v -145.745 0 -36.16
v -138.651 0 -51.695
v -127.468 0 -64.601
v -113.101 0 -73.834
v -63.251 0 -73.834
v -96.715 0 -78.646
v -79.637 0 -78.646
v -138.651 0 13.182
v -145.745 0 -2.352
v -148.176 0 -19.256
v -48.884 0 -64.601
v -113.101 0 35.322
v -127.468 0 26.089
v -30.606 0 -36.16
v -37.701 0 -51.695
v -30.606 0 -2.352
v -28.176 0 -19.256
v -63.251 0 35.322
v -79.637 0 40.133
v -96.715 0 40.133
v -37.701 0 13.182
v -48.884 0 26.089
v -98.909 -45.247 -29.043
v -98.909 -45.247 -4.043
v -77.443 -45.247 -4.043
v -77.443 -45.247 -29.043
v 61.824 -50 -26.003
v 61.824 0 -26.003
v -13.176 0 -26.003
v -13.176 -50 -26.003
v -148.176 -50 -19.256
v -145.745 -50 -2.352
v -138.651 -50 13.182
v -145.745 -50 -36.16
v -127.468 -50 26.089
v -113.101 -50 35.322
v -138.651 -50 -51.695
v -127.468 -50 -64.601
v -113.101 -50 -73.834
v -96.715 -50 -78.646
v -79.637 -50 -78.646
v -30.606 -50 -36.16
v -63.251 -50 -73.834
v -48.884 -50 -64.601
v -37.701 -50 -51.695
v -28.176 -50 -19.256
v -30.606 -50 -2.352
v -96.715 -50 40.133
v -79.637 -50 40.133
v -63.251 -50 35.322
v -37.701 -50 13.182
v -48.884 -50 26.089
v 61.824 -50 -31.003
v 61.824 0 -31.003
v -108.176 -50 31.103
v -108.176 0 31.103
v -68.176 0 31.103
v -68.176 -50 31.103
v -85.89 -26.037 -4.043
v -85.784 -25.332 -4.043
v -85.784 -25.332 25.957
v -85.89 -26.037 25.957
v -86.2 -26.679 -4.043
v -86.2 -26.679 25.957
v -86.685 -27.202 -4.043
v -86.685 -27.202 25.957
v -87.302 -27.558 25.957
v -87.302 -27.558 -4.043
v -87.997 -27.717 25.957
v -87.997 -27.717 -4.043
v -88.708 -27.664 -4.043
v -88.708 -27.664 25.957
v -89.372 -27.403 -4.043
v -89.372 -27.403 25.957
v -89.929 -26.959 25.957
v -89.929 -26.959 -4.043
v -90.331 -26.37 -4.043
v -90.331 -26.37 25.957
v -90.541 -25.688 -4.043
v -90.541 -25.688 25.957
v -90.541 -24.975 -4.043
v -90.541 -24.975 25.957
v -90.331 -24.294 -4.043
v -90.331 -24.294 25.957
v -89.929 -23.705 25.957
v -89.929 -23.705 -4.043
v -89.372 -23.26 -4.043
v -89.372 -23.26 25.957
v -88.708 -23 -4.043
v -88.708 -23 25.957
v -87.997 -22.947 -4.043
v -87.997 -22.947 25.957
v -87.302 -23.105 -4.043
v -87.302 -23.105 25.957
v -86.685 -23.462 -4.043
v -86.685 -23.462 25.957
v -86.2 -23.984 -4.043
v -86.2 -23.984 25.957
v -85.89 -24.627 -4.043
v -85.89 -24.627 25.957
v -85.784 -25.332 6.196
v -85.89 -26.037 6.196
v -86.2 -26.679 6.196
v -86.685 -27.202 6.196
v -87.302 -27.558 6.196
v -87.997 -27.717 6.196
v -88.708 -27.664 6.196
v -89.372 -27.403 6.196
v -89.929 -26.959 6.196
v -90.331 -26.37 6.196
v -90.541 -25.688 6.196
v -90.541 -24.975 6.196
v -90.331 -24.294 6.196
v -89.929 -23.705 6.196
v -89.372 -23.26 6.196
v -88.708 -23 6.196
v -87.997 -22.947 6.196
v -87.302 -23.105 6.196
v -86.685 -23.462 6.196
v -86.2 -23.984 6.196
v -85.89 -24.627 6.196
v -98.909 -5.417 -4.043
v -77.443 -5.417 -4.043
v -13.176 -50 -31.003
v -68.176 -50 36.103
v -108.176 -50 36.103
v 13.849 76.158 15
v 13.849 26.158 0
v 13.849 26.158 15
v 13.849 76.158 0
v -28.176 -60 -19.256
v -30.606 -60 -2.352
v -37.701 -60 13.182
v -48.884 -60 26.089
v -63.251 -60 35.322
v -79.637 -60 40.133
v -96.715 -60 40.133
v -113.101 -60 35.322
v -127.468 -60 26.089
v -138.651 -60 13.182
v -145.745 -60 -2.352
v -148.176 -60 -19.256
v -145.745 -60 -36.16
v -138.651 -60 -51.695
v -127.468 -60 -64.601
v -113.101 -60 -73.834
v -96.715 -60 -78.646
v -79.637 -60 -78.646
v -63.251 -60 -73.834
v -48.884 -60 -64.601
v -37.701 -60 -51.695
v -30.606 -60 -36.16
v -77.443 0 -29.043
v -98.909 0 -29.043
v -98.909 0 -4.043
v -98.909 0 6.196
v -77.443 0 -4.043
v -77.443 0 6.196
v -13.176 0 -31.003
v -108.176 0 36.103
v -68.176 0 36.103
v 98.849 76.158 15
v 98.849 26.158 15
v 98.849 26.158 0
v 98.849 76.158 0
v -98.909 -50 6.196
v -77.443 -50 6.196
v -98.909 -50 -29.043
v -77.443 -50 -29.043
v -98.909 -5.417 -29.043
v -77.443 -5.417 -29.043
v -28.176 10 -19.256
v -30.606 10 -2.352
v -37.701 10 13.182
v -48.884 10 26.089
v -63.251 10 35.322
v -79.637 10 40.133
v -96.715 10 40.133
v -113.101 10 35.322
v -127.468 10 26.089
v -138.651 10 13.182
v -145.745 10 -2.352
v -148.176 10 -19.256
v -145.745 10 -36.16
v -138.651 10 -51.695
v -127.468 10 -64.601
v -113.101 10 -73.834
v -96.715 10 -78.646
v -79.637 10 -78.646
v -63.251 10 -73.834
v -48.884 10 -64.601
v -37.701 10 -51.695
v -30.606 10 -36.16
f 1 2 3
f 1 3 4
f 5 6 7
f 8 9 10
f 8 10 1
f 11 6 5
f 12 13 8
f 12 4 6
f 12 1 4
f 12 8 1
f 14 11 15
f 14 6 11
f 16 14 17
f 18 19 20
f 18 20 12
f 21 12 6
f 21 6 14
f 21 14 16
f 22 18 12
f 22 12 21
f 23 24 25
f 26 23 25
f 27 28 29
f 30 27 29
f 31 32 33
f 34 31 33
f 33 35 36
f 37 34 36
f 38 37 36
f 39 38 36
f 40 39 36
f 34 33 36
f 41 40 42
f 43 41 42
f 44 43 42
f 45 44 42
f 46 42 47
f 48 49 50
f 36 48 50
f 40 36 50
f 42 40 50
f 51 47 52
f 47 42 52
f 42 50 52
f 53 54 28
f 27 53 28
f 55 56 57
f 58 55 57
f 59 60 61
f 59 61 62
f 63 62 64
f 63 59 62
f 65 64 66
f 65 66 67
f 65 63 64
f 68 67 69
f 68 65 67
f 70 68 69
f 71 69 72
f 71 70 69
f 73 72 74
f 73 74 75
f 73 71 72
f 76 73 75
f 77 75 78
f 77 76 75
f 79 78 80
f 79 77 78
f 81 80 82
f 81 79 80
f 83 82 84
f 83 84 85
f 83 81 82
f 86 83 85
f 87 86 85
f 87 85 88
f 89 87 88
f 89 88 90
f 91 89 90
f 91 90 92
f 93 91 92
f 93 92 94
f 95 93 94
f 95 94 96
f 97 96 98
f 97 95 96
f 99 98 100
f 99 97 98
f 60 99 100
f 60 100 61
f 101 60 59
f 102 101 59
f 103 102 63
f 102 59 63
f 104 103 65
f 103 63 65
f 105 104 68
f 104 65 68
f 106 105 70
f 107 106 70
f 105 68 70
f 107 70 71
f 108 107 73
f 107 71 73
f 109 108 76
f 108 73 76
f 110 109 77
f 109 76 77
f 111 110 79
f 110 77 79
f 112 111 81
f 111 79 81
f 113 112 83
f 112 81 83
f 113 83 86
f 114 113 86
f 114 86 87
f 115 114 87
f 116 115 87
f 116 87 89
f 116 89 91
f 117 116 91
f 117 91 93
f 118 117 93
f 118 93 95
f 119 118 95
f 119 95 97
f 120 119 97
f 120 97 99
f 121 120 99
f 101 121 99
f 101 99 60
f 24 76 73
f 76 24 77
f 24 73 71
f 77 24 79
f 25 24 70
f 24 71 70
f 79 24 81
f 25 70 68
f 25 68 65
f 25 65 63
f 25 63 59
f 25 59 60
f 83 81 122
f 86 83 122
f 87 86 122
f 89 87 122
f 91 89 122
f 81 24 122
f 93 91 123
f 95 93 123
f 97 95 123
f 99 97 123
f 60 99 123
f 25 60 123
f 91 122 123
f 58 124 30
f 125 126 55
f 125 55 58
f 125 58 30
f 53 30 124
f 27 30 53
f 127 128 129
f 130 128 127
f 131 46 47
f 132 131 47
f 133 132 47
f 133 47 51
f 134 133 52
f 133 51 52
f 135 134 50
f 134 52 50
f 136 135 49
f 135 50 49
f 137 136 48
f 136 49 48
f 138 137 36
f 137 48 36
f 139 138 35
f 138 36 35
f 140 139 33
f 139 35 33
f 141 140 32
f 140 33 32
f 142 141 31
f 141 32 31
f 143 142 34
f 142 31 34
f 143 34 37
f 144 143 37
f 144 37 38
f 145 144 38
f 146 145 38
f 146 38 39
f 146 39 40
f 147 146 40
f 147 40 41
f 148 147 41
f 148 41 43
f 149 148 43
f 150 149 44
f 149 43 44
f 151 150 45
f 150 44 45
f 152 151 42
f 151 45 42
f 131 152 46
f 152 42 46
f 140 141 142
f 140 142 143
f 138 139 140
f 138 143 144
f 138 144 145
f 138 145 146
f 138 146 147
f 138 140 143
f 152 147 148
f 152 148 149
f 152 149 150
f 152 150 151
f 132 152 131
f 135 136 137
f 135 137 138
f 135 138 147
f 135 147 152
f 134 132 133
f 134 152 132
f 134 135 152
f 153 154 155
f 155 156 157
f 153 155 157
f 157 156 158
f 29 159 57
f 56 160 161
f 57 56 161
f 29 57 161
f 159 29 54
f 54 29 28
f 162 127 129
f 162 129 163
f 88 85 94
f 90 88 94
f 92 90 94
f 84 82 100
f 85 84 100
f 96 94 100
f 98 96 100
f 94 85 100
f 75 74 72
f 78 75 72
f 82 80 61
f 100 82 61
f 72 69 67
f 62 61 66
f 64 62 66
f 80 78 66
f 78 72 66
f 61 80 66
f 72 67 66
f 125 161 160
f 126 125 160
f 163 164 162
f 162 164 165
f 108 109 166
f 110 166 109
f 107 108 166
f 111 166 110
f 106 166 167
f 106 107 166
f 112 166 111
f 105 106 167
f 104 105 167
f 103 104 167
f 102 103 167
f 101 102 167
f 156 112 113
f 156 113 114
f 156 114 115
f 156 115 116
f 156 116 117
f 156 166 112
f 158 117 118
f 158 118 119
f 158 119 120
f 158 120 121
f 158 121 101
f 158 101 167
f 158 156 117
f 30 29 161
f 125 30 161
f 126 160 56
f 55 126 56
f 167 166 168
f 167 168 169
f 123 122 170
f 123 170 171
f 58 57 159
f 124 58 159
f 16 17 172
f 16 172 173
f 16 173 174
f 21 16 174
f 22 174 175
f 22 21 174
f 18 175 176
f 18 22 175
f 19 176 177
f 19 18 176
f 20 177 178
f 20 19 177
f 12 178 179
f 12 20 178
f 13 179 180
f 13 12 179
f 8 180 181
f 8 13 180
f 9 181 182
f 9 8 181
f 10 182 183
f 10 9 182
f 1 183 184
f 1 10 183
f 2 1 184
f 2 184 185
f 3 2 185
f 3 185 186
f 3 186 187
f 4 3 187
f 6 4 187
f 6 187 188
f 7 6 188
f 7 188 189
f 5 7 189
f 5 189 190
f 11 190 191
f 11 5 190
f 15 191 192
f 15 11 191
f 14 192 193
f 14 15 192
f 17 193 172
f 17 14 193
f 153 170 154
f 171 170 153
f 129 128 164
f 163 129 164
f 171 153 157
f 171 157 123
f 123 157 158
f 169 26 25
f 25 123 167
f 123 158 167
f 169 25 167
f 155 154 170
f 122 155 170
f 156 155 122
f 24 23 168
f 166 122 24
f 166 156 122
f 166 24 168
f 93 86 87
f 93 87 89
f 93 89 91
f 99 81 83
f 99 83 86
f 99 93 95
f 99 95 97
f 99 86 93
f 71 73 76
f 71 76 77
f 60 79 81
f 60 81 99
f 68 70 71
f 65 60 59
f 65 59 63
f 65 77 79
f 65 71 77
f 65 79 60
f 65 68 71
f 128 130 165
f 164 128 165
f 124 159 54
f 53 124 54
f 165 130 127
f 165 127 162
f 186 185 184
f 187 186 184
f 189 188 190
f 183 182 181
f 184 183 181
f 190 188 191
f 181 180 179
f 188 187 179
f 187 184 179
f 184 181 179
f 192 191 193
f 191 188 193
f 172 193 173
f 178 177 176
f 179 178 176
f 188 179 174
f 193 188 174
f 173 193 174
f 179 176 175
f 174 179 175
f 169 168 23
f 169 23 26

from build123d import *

# Parameters (mm, degrees)
F1_DEPTH  = 50
F0_W      = 21.4654916469
F0_H      = 10.2392081211
F2_W      = 21.4654916469
F2_H      = 4.7531977296
F2_H_2    = 5.4168240167
F3_DEPTH  = 25
F4_R      = 60
F4_W      = 21.4654916469
F4_H      = 35.2392081211
F5_DEPTH  = 10
F6_START  = -50
F6_DEPTH  = 10
F7_R      = 2.3919276082
F8_DEPTH  = 30
F10_W     = 85
F10_H     = 50
F11_DEPTH = 15


with BuildPart() as f1:
    # F0 (on Front) → F1 (new body)
    with BuildSketch(Plane.XZ):
        Polygon((-68.1759184846, 36.1026065934), (-108.1759184846, 36.1026065934), (-108.1759184846, 31.1026065934), (-68.1759184846, 31.1026065934), (-13.1759184846, -31.0028278501), (61.8240815154, -31.0028278501), (61.8240815154, -26.0028278501), (-13.1759184846, -26.0028278501), align=None)
    extrude(amount=F1_DEPTH)


with BuildPart() as f1b:
    # F0 (on Front) → F1, piece 2 (new body)
    with BuildSketch(Plane.XZ):
        with Locations((-88.1759184846, 1.0764846312)):
            Rectangle(F0_W, F0_H)
    extrude(amount=F1_DEPTH)

    # F2 (on face) → F3 (join)
    with BuildSketch(Plane(origin=(0, 0, -4.0431194294), x_dir=(1, 0, 0), z_dir=(0, 0, -1))):
        with Locations((-88.1759184846, 47.6234011352)):
            Rectangle(F2_W, F2_H)
        with Locations((-88.1759184846, 2.7084120084)):
            Rectangle(F2_W, F2_H_2)
    extrude(amount=F3_DEPTH)


with BuildPart() as f5:
    # F4 (on face) → F5 (new body)
    with BuildSketch(Plane.XZ.offset(50)):
        with Locations((-88.1759184846, -19.2563140502)):
            Circle(F4_R)
        with Locations((-88.1759184846, -11.4235153688)):
            Rectangle(F4_W, F4_H, mode=Mode.SUBTRACT)
        with Locations((-88.1759184846, -11.4235153688)):
            Rectangle(F4_W, F4_H)
    extrude(amount=F5_DEPTH)


with BuildPart() as f6:
    # F4 (on face) → F6 (new body)
    with BuildSketch(Plane.XZ.offset(50).offset(F6_START)):
        with Locations((-88.1759184846, -19.2563140502)):
            Circle(F4_R)
    extrude(amount=-F6_DEPTH)


with BuildPart() as f8:
    # F7 (on face) → F8 (new body)
    with BuildSketch(Plane(origin=(0, 0, -4.0431194294), x_dir=(1, 0, 0), z_dir=(0, 0, -1))):
        with Locations((-88.1759184846, 25.3318131436)):
            Circle(F7_R)
    extrude(amount=-F8_DEPTH)


with BuildPart() as f1_1:
    add(f1.part)

    # F9: cut F8
    add(f8.part, mode=Mode.SUBTRACT)


with BuildPart() as f1b_1:
    add(f1b.part)

    # F9: cut F8
    add(f8.part, mode=Mode.SUBTRACT)


with BuildPart() as f11:
    # F10 (on Top) → F11 (new body)
    with BuildSketch(Plane.XY):
        with Locations((56.3487377763, 51.1584613472)):
            Rectangle(F10_W, F10_H)
    extrude(amount=F11_DEPTH)


solid = Compound([f5.part, f6.part, f8.part, f1_1.part, f1b_1.part, f11.part])
